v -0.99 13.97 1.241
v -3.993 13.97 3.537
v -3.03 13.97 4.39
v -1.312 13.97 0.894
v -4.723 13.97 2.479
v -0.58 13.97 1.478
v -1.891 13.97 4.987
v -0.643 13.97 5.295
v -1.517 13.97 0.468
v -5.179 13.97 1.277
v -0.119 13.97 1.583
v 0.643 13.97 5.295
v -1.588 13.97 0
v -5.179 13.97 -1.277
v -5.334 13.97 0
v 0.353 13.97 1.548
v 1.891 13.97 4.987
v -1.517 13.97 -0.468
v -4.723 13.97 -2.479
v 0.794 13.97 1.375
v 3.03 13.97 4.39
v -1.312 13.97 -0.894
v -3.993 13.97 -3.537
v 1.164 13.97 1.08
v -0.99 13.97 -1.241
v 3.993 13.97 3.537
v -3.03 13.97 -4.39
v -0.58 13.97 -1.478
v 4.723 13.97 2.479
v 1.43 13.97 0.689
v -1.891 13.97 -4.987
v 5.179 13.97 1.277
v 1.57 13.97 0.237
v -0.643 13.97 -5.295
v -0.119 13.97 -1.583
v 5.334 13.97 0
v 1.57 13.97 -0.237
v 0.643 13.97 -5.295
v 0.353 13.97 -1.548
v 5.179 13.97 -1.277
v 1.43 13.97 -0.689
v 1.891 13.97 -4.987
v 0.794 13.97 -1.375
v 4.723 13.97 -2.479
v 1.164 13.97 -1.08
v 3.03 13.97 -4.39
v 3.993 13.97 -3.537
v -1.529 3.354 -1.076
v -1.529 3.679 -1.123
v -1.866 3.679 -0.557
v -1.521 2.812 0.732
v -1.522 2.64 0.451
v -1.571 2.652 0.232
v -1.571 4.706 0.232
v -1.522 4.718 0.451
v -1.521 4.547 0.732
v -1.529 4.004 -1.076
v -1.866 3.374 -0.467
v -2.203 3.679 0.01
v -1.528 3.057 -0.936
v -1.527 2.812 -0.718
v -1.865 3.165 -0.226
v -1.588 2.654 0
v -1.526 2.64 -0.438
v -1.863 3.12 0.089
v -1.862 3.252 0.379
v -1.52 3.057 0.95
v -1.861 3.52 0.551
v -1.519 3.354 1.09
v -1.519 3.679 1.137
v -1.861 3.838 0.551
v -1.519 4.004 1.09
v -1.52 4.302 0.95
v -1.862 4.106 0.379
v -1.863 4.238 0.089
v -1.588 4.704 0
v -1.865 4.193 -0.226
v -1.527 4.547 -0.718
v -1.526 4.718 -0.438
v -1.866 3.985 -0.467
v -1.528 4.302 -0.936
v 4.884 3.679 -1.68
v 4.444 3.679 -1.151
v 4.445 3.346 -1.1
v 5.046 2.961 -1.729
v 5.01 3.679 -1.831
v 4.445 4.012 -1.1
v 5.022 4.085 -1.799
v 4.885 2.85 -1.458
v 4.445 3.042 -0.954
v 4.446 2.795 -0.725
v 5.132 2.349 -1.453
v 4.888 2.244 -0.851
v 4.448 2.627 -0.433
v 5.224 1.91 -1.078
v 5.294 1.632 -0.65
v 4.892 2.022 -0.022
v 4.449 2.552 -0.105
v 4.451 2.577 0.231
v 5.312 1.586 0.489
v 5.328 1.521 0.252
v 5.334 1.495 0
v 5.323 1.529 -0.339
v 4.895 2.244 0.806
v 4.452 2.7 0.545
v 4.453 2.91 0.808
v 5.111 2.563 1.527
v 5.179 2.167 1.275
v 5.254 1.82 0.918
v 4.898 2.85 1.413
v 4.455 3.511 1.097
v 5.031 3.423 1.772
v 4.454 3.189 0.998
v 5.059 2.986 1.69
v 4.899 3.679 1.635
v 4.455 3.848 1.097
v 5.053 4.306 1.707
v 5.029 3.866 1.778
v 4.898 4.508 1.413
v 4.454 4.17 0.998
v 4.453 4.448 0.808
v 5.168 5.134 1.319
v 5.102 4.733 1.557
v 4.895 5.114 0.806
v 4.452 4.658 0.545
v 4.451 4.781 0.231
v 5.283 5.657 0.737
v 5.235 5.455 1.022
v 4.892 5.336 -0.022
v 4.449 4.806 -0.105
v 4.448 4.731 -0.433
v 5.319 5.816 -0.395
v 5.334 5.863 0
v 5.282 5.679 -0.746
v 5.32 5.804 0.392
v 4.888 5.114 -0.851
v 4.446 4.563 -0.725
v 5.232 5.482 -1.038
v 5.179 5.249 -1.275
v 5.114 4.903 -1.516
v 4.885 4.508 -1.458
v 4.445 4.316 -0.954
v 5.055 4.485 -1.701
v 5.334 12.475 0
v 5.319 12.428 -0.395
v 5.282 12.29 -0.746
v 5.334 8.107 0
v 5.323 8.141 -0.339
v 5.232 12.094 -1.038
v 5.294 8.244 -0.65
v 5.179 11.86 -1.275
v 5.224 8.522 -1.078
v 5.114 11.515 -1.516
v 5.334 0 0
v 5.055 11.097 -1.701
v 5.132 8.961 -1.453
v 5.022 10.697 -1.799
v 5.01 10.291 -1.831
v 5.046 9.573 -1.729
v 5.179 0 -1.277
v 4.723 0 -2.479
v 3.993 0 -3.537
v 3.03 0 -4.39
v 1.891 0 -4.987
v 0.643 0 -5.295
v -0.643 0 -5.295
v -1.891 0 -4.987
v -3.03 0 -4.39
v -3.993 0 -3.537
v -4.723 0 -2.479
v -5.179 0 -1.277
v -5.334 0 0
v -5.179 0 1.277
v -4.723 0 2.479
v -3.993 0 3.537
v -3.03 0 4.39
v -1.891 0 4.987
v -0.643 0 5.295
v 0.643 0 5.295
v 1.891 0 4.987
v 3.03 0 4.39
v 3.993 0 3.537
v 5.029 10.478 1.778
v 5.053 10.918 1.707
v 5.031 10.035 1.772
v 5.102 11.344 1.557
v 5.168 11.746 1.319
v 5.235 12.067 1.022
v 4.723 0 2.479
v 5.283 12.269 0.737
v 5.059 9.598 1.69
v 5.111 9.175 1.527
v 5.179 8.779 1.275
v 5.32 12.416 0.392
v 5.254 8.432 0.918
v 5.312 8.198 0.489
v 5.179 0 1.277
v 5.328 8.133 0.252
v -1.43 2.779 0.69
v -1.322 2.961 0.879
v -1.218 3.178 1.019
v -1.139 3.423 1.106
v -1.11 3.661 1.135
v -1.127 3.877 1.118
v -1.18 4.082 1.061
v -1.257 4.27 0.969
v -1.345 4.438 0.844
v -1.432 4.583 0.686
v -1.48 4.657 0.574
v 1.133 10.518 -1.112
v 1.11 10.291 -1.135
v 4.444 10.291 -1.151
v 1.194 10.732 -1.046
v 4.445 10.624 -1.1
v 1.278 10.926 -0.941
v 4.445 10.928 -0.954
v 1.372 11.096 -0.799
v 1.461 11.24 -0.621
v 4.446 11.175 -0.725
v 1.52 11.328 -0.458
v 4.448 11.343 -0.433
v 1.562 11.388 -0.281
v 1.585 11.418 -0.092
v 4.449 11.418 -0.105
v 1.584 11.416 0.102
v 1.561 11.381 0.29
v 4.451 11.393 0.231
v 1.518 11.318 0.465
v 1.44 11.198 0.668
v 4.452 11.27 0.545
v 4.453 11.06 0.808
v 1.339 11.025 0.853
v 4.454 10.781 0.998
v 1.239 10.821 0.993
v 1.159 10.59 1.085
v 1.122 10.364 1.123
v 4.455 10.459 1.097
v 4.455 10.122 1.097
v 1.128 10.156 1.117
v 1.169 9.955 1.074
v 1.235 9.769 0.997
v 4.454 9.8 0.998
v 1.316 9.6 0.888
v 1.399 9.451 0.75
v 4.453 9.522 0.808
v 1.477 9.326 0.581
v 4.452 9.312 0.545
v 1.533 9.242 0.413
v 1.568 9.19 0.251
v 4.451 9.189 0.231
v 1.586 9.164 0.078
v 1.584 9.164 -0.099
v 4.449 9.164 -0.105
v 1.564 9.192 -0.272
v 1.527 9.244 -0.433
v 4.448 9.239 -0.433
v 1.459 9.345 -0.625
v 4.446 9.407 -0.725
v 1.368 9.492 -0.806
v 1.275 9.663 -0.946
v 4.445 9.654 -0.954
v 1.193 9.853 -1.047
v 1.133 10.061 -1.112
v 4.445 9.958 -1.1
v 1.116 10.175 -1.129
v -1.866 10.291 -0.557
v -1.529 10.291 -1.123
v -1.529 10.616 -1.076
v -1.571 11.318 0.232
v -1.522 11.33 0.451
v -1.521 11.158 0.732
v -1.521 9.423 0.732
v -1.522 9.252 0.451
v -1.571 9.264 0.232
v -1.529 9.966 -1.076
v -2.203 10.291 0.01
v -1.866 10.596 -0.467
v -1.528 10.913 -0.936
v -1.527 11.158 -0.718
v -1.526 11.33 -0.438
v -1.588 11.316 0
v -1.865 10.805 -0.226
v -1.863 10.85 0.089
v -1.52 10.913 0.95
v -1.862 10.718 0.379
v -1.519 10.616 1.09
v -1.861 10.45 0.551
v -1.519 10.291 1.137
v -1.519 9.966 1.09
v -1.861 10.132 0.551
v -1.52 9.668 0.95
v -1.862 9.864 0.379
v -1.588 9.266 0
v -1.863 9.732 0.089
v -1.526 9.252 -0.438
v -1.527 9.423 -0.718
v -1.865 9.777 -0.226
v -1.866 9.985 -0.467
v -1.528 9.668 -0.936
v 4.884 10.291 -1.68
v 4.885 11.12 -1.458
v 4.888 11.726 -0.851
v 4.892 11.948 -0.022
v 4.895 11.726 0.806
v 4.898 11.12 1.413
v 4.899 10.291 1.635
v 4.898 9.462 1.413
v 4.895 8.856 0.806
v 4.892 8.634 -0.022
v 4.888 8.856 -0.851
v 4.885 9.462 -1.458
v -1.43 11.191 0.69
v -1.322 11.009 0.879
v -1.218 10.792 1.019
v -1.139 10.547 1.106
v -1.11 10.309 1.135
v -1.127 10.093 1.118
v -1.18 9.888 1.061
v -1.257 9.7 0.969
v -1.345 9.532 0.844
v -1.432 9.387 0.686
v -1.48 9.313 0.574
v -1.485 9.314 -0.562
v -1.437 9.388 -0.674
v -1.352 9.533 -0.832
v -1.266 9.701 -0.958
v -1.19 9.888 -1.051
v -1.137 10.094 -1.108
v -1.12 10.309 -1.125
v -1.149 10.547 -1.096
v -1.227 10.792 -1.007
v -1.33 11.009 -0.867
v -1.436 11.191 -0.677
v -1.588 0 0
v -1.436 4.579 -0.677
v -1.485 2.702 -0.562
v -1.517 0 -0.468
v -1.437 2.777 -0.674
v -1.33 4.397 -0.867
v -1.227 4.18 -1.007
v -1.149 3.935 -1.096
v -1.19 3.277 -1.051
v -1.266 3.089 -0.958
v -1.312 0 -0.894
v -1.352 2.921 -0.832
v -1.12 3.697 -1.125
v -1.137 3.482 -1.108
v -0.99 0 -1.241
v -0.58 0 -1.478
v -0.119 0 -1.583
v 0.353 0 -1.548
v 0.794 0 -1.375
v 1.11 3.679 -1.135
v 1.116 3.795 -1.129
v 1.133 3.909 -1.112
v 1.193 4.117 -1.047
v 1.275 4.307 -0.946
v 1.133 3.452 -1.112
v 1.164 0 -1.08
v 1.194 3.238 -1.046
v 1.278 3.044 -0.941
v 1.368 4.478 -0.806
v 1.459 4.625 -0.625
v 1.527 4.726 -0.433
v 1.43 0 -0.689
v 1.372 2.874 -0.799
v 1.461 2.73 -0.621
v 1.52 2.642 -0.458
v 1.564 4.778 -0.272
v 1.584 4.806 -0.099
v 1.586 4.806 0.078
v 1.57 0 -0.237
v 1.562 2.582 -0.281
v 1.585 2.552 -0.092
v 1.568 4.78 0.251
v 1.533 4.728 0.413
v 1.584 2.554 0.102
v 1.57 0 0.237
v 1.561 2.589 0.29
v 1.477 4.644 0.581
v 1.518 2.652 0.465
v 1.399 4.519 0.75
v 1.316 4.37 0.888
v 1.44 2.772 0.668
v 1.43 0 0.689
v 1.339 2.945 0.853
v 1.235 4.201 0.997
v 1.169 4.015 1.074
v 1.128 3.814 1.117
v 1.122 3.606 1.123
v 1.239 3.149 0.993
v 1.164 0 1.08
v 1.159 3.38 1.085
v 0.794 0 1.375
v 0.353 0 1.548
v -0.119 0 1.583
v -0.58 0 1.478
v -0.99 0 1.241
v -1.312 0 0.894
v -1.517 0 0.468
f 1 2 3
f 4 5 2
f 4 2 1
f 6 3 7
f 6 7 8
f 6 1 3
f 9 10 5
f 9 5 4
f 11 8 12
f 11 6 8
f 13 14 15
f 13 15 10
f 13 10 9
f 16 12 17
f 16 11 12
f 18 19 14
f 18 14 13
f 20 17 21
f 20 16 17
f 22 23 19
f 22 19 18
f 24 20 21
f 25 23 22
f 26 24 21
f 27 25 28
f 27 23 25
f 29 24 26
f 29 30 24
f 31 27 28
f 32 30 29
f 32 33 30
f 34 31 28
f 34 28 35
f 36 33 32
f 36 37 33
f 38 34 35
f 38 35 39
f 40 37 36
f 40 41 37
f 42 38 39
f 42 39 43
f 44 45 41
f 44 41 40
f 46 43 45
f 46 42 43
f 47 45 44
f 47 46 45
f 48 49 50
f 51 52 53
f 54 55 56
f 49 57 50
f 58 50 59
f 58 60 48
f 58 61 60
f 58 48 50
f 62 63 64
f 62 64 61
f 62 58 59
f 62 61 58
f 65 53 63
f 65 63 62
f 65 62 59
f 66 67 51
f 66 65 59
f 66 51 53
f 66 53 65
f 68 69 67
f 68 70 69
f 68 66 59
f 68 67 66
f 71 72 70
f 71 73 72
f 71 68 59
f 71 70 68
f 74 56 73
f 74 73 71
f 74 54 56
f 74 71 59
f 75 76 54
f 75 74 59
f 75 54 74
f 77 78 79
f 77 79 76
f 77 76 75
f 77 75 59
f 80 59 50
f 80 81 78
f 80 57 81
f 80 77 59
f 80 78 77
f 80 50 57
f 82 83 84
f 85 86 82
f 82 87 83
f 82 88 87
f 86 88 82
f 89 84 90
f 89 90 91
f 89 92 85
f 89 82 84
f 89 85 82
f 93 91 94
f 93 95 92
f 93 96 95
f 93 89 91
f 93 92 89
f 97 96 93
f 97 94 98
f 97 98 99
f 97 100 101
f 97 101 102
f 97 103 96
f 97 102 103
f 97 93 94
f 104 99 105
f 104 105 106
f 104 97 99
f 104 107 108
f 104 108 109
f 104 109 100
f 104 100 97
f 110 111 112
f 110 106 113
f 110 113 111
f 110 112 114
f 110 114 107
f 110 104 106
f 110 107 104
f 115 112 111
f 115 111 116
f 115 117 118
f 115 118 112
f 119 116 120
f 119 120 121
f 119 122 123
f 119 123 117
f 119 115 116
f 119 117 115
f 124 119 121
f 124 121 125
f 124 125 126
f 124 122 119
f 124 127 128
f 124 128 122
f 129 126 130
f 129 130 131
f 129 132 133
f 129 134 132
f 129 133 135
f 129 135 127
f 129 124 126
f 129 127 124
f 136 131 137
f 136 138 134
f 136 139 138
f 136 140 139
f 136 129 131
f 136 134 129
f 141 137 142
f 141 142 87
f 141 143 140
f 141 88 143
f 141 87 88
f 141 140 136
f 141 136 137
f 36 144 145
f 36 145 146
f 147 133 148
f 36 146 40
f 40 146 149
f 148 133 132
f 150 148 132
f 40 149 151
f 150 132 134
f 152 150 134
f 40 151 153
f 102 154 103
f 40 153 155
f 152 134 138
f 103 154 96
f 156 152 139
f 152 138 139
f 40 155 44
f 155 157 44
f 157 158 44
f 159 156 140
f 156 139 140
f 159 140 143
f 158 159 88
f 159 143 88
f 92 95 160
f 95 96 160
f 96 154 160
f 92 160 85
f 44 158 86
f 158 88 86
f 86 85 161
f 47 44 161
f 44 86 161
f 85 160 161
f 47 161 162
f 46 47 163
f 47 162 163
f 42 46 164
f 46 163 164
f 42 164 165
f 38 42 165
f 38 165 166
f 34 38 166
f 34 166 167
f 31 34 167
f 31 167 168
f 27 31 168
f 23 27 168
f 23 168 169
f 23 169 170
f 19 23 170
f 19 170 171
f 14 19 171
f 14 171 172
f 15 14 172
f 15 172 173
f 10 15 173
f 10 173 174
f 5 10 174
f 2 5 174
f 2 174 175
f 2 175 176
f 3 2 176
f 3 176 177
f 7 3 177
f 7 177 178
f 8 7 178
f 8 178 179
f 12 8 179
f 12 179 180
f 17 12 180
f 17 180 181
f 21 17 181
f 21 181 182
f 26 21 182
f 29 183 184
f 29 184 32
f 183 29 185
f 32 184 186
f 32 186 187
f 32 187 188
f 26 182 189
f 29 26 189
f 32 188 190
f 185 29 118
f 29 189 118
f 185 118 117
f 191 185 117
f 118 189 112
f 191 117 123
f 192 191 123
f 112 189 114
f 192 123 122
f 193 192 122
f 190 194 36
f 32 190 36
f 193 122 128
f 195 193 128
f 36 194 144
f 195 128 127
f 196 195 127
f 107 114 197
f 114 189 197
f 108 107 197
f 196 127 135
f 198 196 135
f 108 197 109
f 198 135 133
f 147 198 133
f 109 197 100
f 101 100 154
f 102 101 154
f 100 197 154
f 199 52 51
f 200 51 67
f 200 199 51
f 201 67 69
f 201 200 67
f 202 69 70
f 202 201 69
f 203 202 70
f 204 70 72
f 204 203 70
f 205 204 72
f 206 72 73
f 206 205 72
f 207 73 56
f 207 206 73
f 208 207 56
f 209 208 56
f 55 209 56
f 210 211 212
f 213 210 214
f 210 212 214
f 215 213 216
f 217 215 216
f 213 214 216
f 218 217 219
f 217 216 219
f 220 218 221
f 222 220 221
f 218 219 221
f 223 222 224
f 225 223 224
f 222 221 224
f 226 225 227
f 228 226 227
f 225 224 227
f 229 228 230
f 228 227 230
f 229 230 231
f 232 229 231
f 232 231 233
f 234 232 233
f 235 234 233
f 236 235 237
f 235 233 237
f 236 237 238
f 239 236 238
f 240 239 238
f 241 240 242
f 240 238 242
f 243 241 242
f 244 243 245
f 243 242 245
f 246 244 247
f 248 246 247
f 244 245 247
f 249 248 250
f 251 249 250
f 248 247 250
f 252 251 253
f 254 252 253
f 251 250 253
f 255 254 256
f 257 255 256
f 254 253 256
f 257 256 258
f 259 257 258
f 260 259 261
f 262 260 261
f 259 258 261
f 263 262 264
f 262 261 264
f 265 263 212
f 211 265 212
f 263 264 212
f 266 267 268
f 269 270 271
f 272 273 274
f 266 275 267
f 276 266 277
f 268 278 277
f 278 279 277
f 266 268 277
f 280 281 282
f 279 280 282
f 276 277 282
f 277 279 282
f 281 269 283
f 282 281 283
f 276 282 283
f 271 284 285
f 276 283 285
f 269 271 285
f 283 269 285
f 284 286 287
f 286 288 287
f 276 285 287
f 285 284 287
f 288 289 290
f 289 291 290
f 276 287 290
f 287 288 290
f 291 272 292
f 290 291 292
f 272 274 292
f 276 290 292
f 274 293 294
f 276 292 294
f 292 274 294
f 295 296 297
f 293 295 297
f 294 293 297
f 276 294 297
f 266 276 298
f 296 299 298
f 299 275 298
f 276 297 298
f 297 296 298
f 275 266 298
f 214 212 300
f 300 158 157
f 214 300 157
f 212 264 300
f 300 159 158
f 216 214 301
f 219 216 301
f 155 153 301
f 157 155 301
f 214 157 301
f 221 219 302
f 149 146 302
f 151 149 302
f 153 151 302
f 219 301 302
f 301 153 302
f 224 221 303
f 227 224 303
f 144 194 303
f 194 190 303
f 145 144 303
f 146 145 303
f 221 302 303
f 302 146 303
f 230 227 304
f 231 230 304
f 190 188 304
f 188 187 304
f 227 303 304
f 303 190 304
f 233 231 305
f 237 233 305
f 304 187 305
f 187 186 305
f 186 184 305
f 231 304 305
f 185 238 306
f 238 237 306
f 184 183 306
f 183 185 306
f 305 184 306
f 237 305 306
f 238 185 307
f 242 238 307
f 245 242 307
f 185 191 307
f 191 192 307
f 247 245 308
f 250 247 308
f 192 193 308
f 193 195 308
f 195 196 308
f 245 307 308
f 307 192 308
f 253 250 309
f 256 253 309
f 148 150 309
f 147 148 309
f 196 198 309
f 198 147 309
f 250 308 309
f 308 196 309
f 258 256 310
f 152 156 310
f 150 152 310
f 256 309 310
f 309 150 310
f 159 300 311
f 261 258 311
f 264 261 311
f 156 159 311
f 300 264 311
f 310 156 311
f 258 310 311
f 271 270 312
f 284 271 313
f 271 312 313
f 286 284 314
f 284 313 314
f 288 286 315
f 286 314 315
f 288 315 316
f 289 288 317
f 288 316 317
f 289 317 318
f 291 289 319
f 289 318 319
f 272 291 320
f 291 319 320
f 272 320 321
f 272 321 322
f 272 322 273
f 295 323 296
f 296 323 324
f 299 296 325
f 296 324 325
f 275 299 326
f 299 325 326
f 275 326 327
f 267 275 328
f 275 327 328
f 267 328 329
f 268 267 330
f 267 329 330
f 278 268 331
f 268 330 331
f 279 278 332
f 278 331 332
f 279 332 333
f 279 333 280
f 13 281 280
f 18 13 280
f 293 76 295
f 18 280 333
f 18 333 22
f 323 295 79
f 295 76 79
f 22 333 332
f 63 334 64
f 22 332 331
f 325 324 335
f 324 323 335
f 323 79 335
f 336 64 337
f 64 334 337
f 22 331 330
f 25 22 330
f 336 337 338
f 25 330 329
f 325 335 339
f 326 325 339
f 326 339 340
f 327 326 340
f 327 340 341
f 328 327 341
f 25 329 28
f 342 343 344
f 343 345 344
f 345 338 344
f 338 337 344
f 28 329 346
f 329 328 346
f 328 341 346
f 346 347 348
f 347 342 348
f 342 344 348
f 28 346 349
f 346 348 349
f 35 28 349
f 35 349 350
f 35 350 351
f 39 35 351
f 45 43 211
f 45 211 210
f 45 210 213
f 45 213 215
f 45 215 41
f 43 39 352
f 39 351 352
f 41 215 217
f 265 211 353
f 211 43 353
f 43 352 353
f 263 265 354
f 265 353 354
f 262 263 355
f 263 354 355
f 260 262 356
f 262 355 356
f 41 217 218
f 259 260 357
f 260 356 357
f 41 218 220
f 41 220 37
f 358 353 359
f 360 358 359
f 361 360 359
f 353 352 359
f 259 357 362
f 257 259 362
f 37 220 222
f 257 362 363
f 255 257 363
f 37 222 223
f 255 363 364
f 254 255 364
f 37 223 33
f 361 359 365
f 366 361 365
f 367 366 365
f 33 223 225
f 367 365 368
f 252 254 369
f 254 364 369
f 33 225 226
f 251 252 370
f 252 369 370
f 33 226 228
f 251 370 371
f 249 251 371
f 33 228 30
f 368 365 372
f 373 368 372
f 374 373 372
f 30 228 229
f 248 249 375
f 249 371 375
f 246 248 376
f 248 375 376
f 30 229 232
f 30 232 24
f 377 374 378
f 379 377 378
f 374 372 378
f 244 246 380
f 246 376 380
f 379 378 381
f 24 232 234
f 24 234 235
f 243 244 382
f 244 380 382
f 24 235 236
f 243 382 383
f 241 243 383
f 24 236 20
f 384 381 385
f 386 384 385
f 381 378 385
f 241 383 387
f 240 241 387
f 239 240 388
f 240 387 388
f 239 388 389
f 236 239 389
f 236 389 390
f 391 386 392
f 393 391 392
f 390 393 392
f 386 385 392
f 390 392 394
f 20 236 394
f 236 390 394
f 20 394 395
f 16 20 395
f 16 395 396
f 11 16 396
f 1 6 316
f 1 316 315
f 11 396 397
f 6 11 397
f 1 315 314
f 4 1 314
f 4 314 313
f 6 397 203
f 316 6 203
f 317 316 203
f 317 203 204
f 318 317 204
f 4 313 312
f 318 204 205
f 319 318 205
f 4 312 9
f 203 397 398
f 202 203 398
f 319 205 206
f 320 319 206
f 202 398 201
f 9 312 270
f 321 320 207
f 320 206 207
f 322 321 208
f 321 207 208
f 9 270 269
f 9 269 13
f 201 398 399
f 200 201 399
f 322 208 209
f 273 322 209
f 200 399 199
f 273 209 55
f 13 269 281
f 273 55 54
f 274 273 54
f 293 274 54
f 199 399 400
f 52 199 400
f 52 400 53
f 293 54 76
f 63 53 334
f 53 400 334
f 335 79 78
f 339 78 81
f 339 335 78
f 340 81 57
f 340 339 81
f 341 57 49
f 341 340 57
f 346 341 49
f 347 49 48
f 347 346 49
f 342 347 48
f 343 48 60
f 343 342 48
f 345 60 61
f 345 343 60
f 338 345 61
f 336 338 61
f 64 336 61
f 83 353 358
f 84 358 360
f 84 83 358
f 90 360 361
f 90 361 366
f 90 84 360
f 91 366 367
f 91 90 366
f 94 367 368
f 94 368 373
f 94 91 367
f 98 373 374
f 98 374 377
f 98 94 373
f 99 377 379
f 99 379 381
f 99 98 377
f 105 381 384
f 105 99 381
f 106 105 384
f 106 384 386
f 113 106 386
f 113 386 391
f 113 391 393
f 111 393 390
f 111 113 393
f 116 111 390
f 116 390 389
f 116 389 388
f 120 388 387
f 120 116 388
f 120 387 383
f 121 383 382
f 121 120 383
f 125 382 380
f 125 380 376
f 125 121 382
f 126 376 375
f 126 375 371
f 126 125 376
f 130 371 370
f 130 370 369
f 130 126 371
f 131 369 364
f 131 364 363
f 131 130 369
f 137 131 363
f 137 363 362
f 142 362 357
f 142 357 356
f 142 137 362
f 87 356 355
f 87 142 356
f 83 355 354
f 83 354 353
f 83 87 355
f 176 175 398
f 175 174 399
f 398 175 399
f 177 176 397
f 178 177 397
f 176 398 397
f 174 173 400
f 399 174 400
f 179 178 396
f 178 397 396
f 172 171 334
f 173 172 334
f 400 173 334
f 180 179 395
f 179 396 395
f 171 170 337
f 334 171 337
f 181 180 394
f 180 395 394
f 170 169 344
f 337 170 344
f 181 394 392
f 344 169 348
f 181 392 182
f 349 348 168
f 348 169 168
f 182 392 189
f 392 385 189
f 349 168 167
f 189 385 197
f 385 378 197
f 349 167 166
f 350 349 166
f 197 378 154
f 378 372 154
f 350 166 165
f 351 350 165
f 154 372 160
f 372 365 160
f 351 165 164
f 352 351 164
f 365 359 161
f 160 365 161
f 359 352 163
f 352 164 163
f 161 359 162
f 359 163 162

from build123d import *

# Parameters (mm, degrees)
SKETCH1_R           = 5.334
BOSS_EXTRUDE1_DEPTH = 13.97
SKETCH2_R           = 1.5875
CUT_EXTRUDE1_DEPTH  = 14.97


with BuildPart() as part:
    # Sketch1 → Boss-Extrude1 (new body)
    with BuildSketch(Plane(origin=(0, 0, 0), x_dir=(1, 0, 0), z_dir=(0, 1, 0))):
        Circle(SKETCH1_R)
    extrude(amount=BOSS_EXTRUDE1_DEPTH)

    # Sketch2 → Cut-Extrude1 (cut, through all)
    with BuildSketch(Plane(origin=(0, 0, 0), x_dir=(-1, 0, 0), z_dir=(0, -1, 0))):
        Circle(SKETCH2_R)
    extrude(amount=-CUT_EXTRUDE1_DEPTH, mode=Mode.SUBTRACT)

    # Sketch6 → CSK for #2 Flat Head Machine Screw (100)2 (revolve, cut)
    with BuildSketch(Plane(origin=(5.33394419, 3.679102393, -0.024400355), x_dir=(-0.004574495, 0, -0.999989537), z_dir=(0, 1, 0))):
        Polygon((0, 0), (0, 7.537152758), (1.1303, 6.858), (1.1303, 0.884494921), (2.1844, 0), align=None)
    csk_for_2_flat_head_machine_screw_100 = revolve(axis=Axis((11.68387775, 3.679102393, -0.053448397), (-0.999989537, 0, 0.004574495)), mode=Mode.SUBTRACT)

    # Mirror3: CSK for #2 Flat Head Machine Screw (100)2 across plane
    add(csk_for_2_flat_head_machine_screw_100.mirror(Plane(origin=(0, 6.985, 0), x_dir=(0, 0, 1), z_dir=(0, -1, 0))), mode=Mode.SUBTRACT)


solid = part.part
